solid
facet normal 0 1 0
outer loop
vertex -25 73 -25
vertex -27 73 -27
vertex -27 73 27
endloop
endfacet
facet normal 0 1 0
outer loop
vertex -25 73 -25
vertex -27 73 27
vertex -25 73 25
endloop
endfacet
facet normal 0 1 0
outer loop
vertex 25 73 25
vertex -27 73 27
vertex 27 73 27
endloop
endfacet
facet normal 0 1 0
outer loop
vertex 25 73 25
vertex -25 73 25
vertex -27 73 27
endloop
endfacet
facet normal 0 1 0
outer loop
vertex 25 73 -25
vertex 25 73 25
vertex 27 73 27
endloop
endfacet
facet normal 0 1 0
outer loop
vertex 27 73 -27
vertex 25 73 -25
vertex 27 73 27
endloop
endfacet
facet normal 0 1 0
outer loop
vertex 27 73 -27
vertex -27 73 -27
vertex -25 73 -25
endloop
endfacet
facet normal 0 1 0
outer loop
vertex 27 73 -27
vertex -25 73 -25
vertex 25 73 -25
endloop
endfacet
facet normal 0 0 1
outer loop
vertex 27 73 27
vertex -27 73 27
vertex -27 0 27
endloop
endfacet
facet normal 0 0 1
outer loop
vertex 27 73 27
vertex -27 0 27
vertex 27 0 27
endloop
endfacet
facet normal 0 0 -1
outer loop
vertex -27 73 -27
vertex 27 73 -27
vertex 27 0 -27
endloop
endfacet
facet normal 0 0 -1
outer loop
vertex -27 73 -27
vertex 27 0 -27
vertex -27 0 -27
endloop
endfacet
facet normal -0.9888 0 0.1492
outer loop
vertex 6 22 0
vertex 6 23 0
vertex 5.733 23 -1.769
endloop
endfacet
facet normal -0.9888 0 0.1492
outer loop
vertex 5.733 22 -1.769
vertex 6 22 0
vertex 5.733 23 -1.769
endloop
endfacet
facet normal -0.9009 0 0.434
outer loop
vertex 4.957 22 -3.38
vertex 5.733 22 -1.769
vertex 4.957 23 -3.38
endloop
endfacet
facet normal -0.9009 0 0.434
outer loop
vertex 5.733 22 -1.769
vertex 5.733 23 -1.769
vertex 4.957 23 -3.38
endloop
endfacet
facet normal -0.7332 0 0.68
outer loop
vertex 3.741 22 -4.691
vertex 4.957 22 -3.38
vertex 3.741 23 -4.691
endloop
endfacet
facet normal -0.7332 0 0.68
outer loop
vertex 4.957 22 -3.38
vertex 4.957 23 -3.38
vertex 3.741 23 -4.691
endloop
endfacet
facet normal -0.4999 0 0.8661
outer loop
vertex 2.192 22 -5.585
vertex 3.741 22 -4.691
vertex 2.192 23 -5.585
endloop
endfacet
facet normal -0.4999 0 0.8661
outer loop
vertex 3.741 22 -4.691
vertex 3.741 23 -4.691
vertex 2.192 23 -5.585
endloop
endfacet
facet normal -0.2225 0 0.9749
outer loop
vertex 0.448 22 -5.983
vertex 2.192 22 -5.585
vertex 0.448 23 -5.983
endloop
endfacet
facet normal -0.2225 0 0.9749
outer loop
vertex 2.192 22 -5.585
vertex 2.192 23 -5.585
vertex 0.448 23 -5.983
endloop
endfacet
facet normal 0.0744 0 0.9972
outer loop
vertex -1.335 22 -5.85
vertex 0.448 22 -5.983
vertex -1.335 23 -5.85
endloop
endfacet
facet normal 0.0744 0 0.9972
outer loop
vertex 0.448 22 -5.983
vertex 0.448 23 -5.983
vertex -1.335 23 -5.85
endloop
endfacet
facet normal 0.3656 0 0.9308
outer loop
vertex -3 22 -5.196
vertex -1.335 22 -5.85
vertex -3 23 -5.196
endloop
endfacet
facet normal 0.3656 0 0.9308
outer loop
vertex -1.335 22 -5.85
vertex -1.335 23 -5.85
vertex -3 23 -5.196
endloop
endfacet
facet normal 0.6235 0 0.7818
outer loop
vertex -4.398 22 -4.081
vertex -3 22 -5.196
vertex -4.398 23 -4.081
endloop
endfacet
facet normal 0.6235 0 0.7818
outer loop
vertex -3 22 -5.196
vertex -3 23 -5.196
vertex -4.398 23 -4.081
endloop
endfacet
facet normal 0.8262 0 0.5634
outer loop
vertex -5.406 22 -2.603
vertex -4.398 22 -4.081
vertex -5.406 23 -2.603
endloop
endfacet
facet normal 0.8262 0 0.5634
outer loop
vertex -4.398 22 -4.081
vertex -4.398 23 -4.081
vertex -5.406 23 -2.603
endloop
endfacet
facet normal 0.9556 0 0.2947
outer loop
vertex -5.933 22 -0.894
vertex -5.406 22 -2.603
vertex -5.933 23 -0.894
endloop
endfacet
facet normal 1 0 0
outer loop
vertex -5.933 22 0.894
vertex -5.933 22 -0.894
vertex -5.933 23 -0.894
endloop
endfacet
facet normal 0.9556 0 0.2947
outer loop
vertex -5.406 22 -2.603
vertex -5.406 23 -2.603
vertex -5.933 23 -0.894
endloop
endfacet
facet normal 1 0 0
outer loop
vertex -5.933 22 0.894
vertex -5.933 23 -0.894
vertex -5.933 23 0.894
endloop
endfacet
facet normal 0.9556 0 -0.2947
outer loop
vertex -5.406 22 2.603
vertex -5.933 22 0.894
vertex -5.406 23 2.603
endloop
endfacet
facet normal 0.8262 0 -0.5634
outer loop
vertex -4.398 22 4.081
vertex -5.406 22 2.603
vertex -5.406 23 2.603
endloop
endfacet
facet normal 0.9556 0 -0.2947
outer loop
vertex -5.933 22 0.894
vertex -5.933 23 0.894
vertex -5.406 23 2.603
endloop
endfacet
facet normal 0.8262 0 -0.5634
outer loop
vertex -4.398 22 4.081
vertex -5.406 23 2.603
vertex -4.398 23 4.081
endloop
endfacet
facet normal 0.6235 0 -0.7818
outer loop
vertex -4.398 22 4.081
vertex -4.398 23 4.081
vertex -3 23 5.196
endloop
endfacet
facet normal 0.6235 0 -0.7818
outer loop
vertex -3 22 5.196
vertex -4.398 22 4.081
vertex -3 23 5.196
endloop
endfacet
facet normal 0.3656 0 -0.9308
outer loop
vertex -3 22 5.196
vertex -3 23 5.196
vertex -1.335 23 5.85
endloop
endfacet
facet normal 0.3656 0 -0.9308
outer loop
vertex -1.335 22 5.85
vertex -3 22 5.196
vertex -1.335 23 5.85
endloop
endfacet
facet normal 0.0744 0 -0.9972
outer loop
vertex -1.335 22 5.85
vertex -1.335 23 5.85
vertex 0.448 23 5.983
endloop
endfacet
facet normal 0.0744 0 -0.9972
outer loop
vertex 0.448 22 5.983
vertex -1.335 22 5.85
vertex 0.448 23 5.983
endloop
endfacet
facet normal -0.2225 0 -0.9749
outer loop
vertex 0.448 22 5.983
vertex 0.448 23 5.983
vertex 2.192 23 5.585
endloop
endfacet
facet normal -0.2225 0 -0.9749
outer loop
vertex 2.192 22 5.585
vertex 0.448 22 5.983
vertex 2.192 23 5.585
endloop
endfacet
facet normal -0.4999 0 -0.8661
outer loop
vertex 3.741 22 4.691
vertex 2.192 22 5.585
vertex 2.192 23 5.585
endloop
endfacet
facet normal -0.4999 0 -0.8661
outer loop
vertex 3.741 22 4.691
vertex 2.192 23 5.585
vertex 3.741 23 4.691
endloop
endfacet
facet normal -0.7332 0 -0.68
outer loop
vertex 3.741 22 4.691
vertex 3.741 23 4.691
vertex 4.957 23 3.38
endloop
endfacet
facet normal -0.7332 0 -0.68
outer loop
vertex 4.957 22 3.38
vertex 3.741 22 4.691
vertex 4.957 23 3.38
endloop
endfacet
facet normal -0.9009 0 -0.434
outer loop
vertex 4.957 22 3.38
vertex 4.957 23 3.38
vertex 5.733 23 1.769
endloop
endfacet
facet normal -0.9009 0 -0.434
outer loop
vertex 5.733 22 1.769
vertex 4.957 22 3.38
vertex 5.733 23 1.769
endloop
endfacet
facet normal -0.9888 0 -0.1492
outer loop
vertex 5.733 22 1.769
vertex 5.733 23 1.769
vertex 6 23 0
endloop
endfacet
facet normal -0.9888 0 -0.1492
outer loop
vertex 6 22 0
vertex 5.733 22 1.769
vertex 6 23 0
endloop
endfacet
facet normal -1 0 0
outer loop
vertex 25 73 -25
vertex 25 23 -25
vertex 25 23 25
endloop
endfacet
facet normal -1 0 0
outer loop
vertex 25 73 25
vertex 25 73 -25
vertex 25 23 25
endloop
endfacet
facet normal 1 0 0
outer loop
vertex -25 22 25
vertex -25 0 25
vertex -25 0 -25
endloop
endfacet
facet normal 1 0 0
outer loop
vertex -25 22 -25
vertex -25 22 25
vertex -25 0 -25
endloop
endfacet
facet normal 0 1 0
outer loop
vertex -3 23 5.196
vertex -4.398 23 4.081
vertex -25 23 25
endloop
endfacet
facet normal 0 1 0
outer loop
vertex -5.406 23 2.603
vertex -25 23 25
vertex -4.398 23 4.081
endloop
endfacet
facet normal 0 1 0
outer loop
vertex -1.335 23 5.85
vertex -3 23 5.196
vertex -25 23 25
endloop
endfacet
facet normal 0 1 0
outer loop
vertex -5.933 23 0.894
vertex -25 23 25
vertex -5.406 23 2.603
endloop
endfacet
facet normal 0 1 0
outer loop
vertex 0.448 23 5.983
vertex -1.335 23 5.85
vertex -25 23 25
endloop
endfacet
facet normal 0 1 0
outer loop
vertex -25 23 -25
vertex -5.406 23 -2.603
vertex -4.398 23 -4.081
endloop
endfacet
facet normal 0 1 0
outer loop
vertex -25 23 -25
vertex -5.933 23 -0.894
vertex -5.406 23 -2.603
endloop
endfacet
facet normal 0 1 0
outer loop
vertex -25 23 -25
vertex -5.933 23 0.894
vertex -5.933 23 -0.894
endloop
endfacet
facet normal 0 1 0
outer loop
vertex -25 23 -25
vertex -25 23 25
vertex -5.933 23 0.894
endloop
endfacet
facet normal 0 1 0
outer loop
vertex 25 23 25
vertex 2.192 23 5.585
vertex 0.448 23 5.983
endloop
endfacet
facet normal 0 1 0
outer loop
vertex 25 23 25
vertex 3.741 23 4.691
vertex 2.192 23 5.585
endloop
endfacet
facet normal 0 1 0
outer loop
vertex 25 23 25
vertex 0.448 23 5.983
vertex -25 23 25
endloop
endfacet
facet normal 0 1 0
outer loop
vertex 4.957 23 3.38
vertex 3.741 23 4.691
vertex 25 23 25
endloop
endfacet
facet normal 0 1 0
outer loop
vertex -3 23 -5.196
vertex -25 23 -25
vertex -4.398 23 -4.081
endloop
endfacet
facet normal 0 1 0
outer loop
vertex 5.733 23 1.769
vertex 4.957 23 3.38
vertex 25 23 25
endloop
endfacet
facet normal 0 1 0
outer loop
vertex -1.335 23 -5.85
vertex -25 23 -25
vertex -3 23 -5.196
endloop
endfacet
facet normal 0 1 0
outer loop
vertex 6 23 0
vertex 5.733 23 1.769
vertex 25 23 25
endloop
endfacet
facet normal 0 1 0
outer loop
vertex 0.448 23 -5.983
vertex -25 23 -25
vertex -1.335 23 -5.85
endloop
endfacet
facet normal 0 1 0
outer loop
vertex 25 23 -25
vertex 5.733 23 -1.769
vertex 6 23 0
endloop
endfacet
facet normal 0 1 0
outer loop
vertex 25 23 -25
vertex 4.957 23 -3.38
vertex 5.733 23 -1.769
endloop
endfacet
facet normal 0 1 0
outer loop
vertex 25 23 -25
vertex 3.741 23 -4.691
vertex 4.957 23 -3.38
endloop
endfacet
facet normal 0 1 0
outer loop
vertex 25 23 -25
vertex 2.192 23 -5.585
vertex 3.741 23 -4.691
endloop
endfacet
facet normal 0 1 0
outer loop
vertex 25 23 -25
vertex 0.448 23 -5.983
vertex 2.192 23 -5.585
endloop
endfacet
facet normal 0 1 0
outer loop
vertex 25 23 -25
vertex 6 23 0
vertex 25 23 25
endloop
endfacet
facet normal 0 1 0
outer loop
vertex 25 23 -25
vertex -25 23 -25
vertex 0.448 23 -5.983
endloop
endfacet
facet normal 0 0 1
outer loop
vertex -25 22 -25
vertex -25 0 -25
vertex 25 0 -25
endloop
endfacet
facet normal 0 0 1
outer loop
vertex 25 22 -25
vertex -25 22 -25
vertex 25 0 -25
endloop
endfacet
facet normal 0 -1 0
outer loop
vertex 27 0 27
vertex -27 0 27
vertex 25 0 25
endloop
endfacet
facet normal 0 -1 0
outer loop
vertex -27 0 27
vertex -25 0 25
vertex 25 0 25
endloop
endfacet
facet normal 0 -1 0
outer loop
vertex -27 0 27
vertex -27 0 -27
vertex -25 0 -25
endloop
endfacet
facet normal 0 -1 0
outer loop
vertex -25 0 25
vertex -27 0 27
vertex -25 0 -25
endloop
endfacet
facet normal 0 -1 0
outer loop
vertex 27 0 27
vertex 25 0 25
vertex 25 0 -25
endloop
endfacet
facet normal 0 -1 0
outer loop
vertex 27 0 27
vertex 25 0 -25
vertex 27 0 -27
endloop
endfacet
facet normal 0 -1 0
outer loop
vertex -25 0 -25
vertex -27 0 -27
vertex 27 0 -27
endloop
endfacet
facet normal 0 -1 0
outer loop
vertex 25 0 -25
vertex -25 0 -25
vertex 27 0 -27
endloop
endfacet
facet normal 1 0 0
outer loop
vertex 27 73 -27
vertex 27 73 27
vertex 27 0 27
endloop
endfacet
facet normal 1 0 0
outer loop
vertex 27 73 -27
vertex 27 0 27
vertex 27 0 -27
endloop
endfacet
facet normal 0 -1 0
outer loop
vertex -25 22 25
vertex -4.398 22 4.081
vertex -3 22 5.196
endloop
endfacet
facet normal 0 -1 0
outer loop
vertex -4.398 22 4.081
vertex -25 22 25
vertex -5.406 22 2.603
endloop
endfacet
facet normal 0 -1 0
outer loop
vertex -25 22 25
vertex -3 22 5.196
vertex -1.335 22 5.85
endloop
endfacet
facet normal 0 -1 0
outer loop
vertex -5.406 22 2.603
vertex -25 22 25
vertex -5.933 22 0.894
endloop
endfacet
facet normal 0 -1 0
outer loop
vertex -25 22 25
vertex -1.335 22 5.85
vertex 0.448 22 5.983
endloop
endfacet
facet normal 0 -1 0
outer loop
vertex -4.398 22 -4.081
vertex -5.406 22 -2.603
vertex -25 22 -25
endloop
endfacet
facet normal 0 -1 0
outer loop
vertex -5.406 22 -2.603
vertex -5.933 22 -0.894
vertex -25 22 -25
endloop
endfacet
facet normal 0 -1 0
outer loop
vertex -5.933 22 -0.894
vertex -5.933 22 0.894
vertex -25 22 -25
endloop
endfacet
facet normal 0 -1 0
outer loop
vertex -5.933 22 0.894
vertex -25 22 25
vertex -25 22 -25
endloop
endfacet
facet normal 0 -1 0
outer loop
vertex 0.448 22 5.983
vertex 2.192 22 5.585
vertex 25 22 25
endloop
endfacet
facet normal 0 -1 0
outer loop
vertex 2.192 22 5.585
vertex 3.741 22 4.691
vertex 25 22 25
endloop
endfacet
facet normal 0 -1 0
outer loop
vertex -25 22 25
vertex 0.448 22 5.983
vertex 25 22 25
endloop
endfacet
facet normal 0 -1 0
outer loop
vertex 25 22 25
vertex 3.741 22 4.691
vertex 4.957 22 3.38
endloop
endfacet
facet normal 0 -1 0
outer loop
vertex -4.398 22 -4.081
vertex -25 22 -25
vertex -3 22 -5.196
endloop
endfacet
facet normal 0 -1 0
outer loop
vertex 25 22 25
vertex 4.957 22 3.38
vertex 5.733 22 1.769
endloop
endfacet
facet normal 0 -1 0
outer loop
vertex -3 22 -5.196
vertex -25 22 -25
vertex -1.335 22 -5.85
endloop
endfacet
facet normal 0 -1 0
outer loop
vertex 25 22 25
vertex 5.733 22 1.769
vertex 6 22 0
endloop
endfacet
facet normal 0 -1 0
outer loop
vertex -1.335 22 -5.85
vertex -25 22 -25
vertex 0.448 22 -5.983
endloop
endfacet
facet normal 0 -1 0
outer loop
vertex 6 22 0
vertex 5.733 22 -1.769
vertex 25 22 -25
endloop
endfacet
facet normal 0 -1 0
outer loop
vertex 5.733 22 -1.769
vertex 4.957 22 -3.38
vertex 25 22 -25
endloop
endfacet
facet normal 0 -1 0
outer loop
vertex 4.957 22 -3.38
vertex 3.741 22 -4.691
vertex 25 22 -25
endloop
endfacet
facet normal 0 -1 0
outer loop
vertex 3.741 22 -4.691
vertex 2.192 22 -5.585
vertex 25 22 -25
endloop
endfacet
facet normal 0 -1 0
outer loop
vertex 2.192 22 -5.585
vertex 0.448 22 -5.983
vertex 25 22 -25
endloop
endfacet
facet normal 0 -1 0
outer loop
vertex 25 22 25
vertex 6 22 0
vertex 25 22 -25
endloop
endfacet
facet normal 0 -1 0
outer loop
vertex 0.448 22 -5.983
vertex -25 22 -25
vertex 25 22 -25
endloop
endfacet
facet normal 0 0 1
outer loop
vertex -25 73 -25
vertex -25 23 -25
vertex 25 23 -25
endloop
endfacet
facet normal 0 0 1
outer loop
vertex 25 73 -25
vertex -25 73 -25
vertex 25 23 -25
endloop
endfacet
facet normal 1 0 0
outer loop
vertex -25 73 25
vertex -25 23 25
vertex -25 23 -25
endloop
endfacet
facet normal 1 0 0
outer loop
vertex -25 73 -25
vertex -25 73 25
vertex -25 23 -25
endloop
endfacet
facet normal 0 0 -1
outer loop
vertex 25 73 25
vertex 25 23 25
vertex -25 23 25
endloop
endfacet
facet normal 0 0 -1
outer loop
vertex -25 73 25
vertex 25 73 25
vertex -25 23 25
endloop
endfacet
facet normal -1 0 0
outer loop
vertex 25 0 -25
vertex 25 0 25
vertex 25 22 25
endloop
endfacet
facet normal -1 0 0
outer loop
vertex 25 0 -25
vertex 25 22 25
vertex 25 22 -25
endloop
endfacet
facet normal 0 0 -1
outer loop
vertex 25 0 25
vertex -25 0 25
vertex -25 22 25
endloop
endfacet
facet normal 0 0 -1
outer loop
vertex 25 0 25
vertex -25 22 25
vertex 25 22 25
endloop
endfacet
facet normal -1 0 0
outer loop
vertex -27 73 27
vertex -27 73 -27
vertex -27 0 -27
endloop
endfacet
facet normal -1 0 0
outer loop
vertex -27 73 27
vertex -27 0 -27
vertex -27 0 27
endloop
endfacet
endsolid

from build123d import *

# Parameters (mm, degrees)
SKETCH1_W           = 54
SKETCH1_H           = 54
SKETCH1_W_2         = 50
SKETCH1_H_2         = 50
BOSS_EXTRUDE1_DEPTH = 22
SKETCH2_W           = 54
SKETCH2_H           = 54
BOSS_EXTRUDE2_DEPTH = 1
SKETCH3_R           = 6
CUT_EXTRUDE1_DEPTH  = 24
SKETCH4_W           = 2
SKETCH4_H           = 50
SKETCH4_H_2         = 2
SKETCH4_W_2         = 50
BOSS_EXTRUDE3_DEPTH = 50


with BuildPart() as part:
    # Sketch1 → Boss-Extrude1 (new body)
    with BuildSketch(Plane(origin=(0, 0, 0), x_dir=(1, 0, 0), z_dir=(0, 1, 0))):
        Rectangle(SKETCH1_W, SKETCH1_H)
        Rectangle(SKETCH1_W_2, SKETCH1_H_2, mode=Mode.SUBTRACT)
    extrude(amount=BOSS_EXTRUDE1_DEPTH)

    # Sketch2 → Boss-Extrude2 (add)
    with BuildSketch(Plane(origin=(0, 22, 0), x_dir=(1, 0, 0), z_dir=(0, 1, 0))):
        Rectangle(SKETCH2_W, SKETCH2_H)
    extrude(amount=BOSS_EXTRUDE2_DEPTH)

    # Sketch3 → Cut-Extrude1 (cut, through all)
    with BuildSketch(Plane(origin=(0, 23, 0), x_dir=(1, 0, 0), z_dir=(0, 1, 0))):
        Circle(SKETCH3_R)
    extrude(amount=-CUT_EXTRUDE1_DEPTH, mode=Mode.SUBTRACT)

    # Sketch4 → Boss-Extrude3 (add)
    with BuildSketch(Plane(origin=(0, 23, 0), x_dir=(1, 0, 0), z_dir=(0, 1, 0))):
        with Locations((-26, 0)):
            Rectangle(SKETCH4_W, SKETCH4_H)
        with Locations((-26, -26)):
            Rectangle(SKETCH4_W, SKETCH4_H_2)
        with Locations((0, -26)):
            Rectangle(SKETCH4_W_2, SKETCH4_H_2)
        with Locations((26, -26)):
            Rectangle(SKETCH4_W, SKETCH4_H_2)
        with Locations((26, 0)):
            Rectangle(SKETCH4_W, SKETCH4_H)
        with Locations((26, 26)):
            Rectangle(SKETCH4_W, SKETCH4_H_2)
        with Locations((0, 26)):
            Rectangle(SKETCH4_W_2, SKETCH4_H_2)
        with Locations((-26, 26)):
            Rectangle(SKETCH4_W, SKETCH4_H_2)
    extrude(amount=BOSS_EXTRUDE3_DEPTH)


solid = part.part
